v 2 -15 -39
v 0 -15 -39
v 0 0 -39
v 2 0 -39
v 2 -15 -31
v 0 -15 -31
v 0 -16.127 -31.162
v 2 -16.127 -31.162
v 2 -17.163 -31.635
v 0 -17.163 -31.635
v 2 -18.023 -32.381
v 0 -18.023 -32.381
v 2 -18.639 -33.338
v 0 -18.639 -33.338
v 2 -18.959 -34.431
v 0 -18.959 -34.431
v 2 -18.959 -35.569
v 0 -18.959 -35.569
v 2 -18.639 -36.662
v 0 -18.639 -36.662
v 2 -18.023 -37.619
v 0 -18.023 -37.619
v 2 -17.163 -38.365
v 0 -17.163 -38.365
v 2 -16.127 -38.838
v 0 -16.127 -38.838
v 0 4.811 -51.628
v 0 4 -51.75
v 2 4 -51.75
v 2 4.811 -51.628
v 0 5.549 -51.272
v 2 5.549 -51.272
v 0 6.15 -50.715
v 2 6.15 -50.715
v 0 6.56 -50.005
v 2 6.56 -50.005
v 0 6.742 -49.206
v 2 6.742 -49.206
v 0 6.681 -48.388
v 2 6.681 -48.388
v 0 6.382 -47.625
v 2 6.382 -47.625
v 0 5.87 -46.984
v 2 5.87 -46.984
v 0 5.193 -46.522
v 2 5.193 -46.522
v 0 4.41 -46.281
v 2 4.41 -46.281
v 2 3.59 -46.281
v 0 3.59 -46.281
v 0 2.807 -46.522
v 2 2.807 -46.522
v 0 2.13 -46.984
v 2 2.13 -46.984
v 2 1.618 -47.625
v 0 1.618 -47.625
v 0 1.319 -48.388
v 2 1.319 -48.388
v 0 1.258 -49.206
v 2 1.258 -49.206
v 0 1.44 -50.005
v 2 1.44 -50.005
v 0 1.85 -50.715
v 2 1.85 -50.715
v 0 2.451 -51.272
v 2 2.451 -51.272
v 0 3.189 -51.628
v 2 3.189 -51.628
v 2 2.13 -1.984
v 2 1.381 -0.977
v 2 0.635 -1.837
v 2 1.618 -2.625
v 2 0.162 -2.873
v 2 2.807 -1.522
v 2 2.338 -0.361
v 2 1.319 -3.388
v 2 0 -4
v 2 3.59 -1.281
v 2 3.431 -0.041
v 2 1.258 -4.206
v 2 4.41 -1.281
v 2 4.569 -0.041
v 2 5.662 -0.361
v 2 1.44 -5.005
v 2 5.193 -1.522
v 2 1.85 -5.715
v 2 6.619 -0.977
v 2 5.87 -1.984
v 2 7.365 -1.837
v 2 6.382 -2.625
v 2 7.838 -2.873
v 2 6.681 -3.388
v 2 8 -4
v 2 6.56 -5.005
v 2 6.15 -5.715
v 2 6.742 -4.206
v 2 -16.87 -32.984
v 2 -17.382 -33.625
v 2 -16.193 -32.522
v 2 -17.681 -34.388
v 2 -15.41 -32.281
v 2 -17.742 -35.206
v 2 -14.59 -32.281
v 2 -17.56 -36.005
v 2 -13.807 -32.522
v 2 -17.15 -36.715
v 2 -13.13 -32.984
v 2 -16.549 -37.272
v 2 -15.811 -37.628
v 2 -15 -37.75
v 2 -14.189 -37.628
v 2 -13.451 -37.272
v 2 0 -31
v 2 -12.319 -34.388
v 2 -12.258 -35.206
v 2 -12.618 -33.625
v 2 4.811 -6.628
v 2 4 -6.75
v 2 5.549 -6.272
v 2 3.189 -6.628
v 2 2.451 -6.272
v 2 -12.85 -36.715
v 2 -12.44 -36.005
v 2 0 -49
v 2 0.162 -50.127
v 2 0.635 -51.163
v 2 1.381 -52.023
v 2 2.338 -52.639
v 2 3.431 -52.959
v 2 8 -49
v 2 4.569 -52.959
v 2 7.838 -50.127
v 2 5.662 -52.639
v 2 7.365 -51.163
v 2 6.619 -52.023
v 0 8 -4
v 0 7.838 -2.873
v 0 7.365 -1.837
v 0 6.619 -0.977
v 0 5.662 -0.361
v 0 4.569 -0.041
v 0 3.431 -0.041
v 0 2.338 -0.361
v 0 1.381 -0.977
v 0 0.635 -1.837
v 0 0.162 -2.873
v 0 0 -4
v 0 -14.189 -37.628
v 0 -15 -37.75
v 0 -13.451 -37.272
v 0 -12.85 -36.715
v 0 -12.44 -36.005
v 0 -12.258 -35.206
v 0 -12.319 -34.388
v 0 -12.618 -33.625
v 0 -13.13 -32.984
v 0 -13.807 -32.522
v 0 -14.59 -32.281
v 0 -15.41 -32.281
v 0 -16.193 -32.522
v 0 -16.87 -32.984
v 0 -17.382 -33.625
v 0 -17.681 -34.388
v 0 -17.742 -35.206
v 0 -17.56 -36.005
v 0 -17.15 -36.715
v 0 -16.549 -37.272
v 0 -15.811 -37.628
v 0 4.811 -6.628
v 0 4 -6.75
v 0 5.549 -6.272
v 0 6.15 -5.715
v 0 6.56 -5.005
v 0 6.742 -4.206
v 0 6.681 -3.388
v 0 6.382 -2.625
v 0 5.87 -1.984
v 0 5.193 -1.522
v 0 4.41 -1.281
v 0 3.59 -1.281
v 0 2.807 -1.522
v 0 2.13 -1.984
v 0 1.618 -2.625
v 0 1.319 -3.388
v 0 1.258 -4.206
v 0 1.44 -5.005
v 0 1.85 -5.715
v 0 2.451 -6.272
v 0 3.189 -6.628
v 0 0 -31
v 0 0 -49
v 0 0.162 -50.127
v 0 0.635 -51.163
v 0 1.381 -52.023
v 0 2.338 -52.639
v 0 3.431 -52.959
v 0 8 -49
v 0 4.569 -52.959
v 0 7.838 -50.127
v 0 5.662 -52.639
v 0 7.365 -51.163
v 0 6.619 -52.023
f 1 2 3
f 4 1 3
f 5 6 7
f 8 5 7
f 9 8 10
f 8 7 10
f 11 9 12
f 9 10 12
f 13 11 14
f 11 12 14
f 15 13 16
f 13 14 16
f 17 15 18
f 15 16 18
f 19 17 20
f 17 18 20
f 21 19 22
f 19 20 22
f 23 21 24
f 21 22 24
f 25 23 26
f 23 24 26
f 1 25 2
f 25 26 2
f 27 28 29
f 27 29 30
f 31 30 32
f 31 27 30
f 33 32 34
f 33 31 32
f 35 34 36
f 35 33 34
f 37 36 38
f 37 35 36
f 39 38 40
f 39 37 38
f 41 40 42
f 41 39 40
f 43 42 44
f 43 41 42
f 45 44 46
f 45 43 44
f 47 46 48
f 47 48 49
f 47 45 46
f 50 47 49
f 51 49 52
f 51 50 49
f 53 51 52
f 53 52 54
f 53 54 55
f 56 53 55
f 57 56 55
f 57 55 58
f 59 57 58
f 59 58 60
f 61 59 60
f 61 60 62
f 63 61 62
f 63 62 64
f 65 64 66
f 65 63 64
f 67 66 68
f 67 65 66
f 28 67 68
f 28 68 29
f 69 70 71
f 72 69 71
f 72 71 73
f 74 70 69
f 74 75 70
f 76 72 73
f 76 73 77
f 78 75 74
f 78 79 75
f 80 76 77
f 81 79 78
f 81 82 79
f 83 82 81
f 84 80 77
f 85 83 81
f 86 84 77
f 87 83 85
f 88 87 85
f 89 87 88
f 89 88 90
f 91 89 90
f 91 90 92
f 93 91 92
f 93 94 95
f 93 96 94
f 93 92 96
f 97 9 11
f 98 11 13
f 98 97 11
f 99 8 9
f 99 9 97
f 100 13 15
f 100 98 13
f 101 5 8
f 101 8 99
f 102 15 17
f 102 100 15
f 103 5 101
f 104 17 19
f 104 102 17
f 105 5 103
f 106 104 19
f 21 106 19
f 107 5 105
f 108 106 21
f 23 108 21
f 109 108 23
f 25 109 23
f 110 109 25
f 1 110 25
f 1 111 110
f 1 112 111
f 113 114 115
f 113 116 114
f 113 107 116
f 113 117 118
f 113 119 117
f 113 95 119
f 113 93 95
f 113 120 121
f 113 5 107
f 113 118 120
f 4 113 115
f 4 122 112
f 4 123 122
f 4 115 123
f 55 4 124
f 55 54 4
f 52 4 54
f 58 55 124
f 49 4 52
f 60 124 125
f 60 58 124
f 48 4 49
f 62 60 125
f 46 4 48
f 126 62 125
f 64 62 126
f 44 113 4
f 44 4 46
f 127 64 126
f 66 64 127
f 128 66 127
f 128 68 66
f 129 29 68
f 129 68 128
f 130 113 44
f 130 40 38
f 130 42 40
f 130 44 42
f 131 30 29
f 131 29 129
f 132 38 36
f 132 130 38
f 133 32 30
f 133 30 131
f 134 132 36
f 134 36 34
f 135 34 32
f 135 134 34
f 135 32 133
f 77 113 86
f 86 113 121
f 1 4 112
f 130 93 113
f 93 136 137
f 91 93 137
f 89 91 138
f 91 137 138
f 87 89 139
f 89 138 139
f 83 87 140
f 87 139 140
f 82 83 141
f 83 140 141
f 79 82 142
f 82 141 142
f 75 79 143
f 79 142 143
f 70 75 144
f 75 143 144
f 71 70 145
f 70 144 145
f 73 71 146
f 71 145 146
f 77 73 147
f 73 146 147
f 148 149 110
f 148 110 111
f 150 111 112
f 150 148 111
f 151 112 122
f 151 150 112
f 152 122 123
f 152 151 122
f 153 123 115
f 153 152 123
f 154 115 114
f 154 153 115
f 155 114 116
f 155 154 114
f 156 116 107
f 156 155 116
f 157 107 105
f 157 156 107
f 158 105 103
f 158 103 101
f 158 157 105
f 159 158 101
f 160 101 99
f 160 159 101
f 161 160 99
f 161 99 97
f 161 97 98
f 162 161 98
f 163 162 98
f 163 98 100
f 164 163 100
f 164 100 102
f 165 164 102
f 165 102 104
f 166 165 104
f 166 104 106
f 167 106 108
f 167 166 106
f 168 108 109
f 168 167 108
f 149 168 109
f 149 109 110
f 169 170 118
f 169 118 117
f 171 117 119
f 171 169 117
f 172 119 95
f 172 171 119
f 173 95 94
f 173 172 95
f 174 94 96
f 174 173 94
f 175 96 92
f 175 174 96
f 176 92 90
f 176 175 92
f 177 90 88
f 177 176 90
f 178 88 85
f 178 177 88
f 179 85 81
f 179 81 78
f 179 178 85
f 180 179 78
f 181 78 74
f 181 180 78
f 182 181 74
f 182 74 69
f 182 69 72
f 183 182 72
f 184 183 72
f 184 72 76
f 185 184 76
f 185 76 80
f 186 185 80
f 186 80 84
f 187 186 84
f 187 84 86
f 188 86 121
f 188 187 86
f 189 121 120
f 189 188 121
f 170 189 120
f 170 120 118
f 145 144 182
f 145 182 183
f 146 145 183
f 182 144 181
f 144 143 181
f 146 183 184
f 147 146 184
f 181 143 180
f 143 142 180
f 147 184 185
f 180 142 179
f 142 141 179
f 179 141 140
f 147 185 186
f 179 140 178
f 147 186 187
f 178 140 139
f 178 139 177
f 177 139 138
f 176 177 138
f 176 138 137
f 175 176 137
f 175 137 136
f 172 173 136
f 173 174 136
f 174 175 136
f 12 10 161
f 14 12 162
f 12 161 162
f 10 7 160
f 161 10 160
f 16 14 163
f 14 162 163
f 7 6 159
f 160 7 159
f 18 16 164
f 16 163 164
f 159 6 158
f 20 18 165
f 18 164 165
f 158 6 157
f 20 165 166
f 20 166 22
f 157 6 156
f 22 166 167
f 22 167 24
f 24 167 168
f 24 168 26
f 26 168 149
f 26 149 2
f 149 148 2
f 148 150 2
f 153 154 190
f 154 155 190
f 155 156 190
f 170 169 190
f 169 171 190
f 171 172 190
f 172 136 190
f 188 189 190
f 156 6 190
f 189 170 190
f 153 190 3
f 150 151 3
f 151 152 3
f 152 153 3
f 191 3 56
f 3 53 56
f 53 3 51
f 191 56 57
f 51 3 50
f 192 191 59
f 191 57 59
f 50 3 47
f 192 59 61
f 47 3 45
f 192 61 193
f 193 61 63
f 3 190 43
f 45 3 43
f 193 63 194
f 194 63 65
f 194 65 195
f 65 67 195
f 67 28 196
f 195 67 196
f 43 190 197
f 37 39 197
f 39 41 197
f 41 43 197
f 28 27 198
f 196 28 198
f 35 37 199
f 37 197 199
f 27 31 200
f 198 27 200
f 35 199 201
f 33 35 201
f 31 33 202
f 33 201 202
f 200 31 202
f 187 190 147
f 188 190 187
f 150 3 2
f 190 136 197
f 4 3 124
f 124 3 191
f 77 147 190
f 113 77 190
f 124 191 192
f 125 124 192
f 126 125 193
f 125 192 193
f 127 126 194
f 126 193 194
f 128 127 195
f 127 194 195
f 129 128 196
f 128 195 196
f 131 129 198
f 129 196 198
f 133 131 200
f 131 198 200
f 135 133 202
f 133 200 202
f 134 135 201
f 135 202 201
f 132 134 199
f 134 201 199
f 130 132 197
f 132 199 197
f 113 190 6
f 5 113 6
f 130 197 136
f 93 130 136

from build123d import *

# Parameters (mm, degrees)
SKETCH1_R           = 2.75
BOSS_EXTRUDE1_DEPTH = 2


with BuildPart() as part:
    # Sketch1 → Boss-Extrude1 (new body)
    with BuildSketch(Plane(origin=(0, 0, 0), x_dir=(0, 0, -1), z_dir=(1, 0, 0))):
        with BuildLine():
            Line((4, 0), (31, 0))
            Line((31, 0), (31, -15))
            ThreePointArc((31, -15), (35, -19), (39, -15))
            Line((39, -15), (39, 0))
            Line((39, 0), (49, 0))
            ThreePointArc((49, 0), (53, 4), (49, 8))
            Line((49, 8), (4, 8))
            ThreePointArc((4, 8), (0, 4), (4, 0))
        make_face()
        with Locations((4, 4)):
            Circle(SKETCH1_R, mode=Mode.SUBTRACT)
        with Locations((35, -15)):
            Circle(SKETCH1_R, mode=Mode.SUBTRACT)
        with Locations((49, 4)):
            Circle(SKETCH1_R, mode=Mode.SUBTRACT)
    extrude(amount=BOSS_EXTRUDE1_DEPTH)


solid = part.part
